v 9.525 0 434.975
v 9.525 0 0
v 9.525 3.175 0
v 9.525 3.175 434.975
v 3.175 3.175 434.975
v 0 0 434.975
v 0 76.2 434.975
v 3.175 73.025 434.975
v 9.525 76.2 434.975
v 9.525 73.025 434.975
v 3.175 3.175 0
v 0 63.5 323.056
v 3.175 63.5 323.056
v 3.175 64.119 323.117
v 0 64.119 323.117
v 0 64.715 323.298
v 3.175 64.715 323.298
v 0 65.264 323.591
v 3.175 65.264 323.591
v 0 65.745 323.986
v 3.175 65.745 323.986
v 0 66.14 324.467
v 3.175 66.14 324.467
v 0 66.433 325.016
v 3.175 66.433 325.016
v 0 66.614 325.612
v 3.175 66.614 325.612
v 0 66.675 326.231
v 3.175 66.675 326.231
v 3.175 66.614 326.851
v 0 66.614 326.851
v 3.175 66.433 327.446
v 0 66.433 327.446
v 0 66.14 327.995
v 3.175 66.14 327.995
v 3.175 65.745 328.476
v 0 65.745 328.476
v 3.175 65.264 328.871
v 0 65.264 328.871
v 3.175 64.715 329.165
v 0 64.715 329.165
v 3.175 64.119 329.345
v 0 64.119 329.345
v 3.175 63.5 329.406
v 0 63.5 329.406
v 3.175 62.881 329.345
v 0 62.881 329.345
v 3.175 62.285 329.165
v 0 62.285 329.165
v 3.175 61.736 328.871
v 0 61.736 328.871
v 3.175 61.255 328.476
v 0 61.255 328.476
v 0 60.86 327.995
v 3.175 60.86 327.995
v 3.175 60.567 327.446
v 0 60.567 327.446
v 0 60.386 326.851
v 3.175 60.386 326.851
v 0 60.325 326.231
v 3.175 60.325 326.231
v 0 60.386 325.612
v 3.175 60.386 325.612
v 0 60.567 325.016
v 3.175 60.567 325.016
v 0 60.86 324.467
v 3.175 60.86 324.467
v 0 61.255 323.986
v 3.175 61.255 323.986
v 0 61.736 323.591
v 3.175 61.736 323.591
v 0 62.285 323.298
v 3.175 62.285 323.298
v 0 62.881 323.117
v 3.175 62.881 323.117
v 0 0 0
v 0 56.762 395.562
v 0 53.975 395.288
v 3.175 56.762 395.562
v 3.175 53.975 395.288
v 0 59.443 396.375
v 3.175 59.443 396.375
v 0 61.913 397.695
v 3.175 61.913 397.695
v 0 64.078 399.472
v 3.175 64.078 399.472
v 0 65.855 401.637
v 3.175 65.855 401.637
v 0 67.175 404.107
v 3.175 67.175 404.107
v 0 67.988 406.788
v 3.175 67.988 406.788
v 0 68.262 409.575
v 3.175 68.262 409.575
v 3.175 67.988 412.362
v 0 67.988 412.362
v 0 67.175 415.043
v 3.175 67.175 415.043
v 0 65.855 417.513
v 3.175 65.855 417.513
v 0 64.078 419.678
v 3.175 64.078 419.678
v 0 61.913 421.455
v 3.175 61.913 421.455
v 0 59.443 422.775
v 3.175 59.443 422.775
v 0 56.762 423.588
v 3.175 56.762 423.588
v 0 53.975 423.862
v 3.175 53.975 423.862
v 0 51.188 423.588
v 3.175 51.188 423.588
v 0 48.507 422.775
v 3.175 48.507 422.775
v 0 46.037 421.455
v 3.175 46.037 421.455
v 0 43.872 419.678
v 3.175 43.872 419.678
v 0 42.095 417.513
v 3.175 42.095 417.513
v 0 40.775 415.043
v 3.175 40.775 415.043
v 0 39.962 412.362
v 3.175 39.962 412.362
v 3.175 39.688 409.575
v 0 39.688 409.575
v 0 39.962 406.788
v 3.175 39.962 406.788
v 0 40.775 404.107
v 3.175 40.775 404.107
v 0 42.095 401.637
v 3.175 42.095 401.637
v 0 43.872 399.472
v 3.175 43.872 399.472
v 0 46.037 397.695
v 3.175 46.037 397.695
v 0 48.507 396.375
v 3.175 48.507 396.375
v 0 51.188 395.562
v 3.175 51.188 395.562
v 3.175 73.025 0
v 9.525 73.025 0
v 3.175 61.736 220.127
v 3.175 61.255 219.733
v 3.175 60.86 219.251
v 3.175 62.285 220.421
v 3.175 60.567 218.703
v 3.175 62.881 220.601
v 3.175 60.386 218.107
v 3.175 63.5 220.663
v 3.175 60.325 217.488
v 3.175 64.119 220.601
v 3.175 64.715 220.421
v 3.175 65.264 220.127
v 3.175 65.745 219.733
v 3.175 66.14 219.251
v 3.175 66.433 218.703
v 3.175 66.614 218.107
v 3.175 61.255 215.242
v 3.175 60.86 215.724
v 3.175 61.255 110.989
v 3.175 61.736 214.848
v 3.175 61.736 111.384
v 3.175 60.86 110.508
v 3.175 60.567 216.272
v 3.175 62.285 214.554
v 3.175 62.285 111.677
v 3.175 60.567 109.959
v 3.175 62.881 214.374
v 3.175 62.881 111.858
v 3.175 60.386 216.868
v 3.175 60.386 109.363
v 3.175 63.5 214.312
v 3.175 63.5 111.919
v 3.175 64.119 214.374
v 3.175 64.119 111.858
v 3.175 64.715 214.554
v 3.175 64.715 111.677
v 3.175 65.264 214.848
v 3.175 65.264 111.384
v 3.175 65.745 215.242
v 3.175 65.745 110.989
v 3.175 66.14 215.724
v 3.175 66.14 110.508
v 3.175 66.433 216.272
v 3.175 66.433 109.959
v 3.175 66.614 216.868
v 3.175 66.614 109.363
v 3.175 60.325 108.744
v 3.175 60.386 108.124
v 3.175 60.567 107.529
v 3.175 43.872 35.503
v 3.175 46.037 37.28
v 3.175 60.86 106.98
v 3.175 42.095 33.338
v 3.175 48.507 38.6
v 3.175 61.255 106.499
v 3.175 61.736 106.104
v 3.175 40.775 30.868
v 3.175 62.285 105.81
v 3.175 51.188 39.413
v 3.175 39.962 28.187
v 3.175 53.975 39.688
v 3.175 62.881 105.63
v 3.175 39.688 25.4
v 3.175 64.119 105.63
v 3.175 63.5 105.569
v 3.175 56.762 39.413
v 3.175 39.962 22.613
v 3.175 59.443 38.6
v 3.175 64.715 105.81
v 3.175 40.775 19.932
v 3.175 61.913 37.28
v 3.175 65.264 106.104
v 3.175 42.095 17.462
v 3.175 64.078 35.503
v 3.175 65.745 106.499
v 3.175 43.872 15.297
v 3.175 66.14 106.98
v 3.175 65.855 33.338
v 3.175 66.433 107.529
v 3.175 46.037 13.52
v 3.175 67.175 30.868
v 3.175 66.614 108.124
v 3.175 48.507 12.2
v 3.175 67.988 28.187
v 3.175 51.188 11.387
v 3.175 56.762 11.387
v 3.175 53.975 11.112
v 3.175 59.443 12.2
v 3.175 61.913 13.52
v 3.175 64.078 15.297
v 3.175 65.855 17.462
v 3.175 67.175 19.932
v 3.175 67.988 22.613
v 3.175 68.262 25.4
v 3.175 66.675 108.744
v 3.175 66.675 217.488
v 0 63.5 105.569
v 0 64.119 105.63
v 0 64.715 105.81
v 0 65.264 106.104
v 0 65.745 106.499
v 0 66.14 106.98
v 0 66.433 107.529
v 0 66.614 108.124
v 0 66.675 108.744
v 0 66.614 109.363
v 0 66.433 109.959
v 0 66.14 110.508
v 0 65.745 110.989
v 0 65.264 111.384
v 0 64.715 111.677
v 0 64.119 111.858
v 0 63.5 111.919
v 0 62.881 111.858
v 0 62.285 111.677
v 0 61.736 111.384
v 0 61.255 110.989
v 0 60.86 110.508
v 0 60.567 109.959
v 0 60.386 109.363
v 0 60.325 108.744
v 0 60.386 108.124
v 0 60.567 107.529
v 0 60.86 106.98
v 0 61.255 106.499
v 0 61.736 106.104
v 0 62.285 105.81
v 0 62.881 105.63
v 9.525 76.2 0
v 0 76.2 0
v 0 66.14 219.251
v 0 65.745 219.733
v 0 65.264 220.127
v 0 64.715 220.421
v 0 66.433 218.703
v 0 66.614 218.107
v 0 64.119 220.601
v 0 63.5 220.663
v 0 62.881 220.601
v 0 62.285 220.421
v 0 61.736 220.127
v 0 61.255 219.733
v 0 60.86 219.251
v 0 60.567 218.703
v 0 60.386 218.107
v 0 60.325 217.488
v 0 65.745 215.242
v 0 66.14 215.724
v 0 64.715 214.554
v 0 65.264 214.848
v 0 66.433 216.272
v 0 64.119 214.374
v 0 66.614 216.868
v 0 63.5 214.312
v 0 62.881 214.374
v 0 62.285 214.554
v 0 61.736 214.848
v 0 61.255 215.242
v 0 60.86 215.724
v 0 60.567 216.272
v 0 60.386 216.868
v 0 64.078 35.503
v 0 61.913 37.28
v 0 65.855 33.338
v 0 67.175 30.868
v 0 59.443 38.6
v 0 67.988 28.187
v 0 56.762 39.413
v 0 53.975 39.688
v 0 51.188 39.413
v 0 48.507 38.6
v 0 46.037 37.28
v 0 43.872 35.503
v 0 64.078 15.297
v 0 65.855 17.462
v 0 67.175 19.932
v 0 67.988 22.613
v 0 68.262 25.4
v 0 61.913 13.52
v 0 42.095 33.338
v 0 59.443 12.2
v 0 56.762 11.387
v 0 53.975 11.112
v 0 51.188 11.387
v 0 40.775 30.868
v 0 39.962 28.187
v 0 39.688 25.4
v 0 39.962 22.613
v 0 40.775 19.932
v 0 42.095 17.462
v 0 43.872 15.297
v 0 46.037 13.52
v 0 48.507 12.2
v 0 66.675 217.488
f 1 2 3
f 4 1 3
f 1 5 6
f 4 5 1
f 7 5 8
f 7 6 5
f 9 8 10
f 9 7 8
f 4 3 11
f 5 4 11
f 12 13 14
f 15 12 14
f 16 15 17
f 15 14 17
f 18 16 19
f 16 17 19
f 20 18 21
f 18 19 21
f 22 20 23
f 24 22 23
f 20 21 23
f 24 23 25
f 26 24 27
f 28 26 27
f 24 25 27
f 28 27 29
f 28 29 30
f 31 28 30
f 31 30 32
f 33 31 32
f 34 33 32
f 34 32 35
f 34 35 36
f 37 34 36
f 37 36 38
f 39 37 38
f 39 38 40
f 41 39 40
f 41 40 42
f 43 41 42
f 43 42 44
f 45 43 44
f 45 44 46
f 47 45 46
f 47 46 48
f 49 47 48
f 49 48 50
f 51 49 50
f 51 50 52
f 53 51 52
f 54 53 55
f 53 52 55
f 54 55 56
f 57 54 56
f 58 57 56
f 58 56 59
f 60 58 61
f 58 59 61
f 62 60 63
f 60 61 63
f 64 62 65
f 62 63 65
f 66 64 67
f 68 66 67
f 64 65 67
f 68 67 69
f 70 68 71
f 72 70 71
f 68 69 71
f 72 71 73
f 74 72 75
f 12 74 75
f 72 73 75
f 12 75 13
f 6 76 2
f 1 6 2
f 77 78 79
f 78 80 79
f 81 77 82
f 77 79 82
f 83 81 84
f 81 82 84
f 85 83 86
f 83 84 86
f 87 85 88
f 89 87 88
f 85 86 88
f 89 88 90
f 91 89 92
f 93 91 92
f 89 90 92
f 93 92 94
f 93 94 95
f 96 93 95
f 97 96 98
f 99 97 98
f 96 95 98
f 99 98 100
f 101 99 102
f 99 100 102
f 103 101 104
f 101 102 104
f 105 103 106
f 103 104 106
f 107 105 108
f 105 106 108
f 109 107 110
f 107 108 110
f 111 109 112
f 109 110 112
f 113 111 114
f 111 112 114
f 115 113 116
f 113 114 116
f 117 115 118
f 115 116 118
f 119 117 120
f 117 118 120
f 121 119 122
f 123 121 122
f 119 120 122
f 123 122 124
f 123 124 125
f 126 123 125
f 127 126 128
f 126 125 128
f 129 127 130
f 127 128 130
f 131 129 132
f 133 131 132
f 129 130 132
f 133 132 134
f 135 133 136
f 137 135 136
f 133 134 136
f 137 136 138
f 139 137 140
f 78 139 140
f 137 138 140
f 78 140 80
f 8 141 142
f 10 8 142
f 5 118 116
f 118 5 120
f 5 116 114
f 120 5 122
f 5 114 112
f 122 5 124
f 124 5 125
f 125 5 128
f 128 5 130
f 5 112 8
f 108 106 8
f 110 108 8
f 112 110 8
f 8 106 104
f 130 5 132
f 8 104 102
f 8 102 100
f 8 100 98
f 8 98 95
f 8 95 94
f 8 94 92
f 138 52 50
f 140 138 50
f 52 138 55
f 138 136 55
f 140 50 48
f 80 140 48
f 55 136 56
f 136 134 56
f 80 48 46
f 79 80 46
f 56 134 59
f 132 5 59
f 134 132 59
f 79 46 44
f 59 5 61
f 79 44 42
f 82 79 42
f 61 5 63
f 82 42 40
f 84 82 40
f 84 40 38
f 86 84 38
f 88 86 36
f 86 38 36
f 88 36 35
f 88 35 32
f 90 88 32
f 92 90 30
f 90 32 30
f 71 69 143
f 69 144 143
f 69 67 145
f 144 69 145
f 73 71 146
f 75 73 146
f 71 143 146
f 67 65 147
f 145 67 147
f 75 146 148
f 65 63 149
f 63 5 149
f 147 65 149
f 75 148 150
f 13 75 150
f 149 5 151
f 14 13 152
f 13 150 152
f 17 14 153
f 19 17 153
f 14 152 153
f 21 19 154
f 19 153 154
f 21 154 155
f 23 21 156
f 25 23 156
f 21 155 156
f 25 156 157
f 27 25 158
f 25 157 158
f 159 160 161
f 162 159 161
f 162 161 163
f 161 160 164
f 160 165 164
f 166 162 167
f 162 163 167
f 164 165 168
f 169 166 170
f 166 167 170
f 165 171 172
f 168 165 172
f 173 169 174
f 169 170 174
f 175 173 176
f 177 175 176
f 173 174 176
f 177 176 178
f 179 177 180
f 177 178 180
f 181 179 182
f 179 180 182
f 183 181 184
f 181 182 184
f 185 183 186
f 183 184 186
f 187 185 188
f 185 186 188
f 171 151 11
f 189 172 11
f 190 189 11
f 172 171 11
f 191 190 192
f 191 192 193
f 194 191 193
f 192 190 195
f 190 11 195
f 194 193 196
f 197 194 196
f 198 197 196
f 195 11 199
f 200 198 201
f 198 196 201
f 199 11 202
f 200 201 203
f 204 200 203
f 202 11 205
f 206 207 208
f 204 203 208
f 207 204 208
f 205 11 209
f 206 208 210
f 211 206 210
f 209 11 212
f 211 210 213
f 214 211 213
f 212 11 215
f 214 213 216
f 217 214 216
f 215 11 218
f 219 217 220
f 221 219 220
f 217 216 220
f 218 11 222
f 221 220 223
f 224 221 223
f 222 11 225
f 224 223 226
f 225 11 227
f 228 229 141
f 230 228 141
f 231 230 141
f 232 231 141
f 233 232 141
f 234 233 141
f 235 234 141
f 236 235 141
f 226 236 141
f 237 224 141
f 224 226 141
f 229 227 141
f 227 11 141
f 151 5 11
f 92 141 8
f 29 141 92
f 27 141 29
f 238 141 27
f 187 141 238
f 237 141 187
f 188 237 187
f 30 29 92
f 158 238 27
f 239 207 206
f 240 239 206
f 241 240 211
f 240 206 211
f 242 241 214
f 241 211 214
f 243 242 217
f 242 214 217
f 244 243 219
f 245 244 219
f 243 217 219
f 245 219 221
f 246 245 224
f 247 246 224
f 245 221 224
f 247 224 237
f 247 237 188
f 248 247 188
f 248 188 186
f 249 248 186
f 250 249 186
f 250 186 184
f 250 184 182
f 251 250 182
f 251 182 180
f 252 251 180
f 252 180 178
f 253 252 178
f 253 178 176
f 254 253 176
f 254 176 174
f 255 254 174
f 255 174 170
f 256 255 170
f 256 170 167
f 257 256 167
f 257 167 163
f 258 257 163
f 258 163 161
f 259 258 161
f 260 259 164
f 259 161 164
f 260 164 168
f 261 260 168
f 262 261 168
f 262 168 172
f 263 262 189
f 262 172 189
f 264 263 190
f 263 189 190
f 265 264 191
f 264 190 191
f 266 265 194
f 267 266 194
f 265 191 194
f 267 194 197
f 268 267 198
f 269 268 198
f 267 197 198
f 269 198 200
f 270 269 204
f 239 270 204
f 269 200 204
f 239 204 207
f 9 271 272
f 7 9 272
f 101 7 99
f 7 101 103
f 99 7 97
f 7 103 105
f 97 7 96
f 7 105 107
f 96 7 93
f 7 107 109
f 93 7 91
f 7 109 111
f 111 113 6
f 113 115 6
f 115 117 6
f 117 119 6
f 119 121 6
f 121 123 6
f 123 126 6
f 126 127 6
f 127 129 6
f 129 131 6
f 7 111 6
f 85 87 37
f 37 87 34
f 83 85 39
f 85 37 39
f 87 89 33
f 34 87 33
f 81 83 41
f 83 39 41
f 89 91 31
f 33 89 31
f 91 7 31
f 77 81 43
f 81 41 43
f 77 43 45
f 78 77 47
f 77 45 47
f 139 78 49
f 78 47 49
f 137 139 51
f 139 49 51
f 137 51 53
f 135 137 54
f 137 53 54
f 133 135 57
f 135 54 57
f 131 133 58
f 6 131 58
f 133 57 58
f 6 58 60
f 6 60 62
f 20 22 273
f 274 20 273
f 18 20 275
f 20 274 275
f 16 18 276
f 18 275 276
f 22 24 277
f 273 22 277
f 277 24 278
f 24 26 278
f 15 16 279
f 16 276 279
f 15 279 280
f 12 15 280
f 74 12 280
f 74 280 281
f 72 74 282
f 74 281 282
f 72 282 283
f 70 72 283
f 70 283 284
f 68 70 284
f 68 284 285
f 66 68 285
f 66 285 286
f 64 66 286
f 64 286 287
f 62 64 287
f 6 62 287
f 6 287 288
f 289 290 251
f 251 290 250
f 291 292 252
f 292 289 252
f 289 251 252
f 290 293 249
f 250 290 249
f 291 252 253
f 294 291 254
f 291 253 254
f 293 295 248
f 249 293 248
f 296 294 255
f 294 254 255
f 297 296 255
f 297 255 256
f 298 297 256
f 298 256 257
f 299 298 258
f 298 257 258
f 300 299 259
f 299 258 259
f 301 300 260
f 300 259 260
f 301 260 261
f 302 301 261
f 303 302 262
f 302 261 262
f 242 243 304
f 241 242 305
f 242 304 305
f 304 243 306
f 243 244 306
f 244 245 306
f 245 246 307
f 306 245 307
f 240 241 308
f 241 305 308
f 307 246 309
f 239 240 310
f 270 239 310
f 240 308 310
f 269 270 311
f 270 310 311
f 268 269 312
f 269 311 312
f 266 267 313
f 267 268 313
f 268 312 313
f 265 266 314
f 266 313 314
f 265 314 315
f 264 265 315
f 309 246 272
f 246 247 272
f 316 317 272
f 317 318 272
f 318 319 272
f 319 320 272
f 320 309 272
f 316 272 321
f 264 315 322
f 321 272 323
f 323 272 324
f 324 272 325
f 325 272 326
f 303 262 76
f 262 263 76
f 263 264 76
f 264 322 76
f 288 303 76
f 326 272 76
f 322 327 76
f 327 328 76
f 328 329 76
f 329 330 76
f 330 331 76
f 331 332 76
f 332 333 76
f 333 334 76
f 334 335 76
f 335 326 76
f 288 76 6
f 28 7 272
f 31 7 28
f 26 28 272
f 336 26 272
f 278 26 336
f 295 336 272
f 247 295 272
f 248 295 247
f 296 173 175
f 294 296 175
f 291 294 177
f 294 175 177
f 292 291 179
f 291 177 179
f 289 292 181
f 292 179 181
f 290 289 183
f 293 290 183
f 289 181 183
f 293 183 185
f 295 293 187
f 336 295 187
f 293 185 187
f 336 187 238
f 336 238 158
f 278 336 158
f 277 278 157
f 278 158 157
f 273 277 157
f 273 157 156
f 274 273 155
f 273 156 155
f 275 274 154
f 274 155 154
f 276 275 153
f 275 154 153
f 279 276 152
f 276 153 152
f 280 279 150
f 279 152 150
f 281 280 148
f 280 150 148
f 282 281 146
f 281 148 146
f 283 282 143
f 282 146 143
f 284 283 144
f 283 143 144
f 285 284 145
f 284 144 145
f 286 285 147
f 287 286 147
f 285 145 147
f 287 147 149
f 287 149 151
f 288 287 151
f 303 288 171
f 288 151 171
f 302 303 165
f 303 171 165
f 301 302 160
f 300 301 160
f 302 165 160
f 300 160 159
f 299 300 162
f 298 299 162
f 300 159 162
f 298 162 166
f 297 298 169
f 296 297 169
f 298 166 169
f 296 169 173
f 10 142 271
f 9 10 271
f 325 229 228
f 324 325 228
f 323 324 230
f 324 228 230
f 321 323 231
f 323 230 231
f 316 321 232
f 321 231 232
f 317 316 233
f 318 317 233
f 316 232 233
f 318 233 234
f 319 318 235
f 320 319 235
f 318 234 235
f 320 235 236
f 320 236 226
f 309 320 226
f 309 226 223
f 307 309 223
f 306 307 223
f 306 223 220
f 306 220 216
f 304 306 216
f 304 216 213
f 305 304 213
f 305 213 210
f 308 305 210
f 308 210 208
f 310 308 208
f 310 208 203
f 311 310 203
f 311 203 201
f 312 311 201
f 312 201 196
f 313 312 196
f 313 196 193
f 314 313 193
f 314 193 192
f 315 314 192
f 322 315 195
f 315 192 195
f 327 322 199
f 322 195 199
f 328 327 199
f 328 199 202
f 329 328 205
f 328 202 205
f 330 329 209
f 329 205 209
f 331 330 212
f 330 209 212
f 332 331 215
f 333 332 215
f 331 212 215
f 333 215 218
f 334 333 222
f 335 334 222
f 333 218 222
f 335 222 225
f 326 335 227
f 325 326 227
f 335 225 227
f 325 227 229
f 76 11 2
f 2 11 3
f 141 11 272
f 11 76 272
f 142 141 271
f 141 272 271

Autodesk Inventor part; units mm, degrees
ref_plane "YZ Plane" through (0, 0, 0) normal (1, 0, 0) x (0, 1, 0)
ref_plane "XZ Plane" through (0, 0, 0) normal (0, 1, 0) x (-1, 0, 0)
ref_plane "XY Plane" through (0, 0, 0) normal (0, 0, 1) x (1, 0, 0)
sketch "Sketch1" plane through (0, 0, 0) normal (0, 0, 1) x (1, 0, 0)
  line L0 (0, 0) -> (9.525, 0)
  line L1 (9.525, 76.2) -> (0, 76.2)
  line L2 (0, 76.2) -> (0, 0)
  line L3 (9.525, 3.175) -> (3.175, 3.175)
  line L4 (3.175, 3.175) -> (3.175, 73.025)
  line L5 (3.175, 73.025) -> (9.525, 73.025)
  line L6 (9.525, 0) -> (9.525, 3.175)
  line L7 (9.525, 73.025) -> (9.525, 76.2)
  dimension "d0" = 3.175
  dimension "d2" = 3.175
  dimension "d3" = 3.175
  dimension "d4" = 76.2
  dimension "d5" = 9.525
extrude "Extrusion1" add sketch "Sketch1" along normal blind 434.975
sketch "Sketch2" plane through (3.175, 3.175, 0) normal (1, 0, 0) x (0, 0, -1)
  line L0 (0, 0) -> (0, 69.85) projected
  line L1 (0, 73.025) -> (-434.975, 73.025) projected
  line L2 (0, -3.175) -> (-434.975, -3.175) projected
  line L3 (-434.975, 0) -> (-434.975, -3.175) projected
  line L4 (-434.975, 73.025) -> (-434.975, 69.85) projected
  line L5 (0, 69.85) -> (0, 73.025) projected
  line L6 (0, -3.175) -> (0, 0) projected
  circle A0 centre (-25.4, 50.8) radius 14.2875
  line L7 (-434.975, 69.85) -> (-434.975, 0) projected
  circle A1 centre (-409.575, 50.8) radius 14.2875
  circle A2 centre (-217.4875, 60.325) radius 3.175
  circle A3 centre (-326.2313, 60.325) radius 3.175
  circle A4 centre (-108.7438, 60.325) radius 3.175
  dimension "d8" = 28.575
  dimension "d10" = 53.975
  dimension "d11" = 25.4
  dimension "d14" = 25.4
  dimension "d15" = 53.975
  dimension "d16" = 28.575
  dimension "d17" = 6.35
  dimension "d18" = 12.7
  dimension "d19" = 217.4875
  dimension "d20" = 108.7438
  dimension "d21" = 108.7438
  dimension "d22" = 6.35
  dimension "d23" = 6.35
  dimension "d24" = 434.975
extrude "Extrusion2" cut sketch "Sketch2" against normal blind 508 contours A0 | A1 | A2 | A3 | A4
equation "\"d3\" = d2"
equation "\"d14\" = d11"
equation "\"d15\" = d10"
equation "\"d16\" = d8"
equation "\"d19\" = 0.5 * d24"
equation "\"d20\" = d21"
equation "\"d21\" = 0.5 * d19"
equation "\"d22\" = d17"
equation "\"d23\" = d17"
properties part number "uptake bearing plate"
